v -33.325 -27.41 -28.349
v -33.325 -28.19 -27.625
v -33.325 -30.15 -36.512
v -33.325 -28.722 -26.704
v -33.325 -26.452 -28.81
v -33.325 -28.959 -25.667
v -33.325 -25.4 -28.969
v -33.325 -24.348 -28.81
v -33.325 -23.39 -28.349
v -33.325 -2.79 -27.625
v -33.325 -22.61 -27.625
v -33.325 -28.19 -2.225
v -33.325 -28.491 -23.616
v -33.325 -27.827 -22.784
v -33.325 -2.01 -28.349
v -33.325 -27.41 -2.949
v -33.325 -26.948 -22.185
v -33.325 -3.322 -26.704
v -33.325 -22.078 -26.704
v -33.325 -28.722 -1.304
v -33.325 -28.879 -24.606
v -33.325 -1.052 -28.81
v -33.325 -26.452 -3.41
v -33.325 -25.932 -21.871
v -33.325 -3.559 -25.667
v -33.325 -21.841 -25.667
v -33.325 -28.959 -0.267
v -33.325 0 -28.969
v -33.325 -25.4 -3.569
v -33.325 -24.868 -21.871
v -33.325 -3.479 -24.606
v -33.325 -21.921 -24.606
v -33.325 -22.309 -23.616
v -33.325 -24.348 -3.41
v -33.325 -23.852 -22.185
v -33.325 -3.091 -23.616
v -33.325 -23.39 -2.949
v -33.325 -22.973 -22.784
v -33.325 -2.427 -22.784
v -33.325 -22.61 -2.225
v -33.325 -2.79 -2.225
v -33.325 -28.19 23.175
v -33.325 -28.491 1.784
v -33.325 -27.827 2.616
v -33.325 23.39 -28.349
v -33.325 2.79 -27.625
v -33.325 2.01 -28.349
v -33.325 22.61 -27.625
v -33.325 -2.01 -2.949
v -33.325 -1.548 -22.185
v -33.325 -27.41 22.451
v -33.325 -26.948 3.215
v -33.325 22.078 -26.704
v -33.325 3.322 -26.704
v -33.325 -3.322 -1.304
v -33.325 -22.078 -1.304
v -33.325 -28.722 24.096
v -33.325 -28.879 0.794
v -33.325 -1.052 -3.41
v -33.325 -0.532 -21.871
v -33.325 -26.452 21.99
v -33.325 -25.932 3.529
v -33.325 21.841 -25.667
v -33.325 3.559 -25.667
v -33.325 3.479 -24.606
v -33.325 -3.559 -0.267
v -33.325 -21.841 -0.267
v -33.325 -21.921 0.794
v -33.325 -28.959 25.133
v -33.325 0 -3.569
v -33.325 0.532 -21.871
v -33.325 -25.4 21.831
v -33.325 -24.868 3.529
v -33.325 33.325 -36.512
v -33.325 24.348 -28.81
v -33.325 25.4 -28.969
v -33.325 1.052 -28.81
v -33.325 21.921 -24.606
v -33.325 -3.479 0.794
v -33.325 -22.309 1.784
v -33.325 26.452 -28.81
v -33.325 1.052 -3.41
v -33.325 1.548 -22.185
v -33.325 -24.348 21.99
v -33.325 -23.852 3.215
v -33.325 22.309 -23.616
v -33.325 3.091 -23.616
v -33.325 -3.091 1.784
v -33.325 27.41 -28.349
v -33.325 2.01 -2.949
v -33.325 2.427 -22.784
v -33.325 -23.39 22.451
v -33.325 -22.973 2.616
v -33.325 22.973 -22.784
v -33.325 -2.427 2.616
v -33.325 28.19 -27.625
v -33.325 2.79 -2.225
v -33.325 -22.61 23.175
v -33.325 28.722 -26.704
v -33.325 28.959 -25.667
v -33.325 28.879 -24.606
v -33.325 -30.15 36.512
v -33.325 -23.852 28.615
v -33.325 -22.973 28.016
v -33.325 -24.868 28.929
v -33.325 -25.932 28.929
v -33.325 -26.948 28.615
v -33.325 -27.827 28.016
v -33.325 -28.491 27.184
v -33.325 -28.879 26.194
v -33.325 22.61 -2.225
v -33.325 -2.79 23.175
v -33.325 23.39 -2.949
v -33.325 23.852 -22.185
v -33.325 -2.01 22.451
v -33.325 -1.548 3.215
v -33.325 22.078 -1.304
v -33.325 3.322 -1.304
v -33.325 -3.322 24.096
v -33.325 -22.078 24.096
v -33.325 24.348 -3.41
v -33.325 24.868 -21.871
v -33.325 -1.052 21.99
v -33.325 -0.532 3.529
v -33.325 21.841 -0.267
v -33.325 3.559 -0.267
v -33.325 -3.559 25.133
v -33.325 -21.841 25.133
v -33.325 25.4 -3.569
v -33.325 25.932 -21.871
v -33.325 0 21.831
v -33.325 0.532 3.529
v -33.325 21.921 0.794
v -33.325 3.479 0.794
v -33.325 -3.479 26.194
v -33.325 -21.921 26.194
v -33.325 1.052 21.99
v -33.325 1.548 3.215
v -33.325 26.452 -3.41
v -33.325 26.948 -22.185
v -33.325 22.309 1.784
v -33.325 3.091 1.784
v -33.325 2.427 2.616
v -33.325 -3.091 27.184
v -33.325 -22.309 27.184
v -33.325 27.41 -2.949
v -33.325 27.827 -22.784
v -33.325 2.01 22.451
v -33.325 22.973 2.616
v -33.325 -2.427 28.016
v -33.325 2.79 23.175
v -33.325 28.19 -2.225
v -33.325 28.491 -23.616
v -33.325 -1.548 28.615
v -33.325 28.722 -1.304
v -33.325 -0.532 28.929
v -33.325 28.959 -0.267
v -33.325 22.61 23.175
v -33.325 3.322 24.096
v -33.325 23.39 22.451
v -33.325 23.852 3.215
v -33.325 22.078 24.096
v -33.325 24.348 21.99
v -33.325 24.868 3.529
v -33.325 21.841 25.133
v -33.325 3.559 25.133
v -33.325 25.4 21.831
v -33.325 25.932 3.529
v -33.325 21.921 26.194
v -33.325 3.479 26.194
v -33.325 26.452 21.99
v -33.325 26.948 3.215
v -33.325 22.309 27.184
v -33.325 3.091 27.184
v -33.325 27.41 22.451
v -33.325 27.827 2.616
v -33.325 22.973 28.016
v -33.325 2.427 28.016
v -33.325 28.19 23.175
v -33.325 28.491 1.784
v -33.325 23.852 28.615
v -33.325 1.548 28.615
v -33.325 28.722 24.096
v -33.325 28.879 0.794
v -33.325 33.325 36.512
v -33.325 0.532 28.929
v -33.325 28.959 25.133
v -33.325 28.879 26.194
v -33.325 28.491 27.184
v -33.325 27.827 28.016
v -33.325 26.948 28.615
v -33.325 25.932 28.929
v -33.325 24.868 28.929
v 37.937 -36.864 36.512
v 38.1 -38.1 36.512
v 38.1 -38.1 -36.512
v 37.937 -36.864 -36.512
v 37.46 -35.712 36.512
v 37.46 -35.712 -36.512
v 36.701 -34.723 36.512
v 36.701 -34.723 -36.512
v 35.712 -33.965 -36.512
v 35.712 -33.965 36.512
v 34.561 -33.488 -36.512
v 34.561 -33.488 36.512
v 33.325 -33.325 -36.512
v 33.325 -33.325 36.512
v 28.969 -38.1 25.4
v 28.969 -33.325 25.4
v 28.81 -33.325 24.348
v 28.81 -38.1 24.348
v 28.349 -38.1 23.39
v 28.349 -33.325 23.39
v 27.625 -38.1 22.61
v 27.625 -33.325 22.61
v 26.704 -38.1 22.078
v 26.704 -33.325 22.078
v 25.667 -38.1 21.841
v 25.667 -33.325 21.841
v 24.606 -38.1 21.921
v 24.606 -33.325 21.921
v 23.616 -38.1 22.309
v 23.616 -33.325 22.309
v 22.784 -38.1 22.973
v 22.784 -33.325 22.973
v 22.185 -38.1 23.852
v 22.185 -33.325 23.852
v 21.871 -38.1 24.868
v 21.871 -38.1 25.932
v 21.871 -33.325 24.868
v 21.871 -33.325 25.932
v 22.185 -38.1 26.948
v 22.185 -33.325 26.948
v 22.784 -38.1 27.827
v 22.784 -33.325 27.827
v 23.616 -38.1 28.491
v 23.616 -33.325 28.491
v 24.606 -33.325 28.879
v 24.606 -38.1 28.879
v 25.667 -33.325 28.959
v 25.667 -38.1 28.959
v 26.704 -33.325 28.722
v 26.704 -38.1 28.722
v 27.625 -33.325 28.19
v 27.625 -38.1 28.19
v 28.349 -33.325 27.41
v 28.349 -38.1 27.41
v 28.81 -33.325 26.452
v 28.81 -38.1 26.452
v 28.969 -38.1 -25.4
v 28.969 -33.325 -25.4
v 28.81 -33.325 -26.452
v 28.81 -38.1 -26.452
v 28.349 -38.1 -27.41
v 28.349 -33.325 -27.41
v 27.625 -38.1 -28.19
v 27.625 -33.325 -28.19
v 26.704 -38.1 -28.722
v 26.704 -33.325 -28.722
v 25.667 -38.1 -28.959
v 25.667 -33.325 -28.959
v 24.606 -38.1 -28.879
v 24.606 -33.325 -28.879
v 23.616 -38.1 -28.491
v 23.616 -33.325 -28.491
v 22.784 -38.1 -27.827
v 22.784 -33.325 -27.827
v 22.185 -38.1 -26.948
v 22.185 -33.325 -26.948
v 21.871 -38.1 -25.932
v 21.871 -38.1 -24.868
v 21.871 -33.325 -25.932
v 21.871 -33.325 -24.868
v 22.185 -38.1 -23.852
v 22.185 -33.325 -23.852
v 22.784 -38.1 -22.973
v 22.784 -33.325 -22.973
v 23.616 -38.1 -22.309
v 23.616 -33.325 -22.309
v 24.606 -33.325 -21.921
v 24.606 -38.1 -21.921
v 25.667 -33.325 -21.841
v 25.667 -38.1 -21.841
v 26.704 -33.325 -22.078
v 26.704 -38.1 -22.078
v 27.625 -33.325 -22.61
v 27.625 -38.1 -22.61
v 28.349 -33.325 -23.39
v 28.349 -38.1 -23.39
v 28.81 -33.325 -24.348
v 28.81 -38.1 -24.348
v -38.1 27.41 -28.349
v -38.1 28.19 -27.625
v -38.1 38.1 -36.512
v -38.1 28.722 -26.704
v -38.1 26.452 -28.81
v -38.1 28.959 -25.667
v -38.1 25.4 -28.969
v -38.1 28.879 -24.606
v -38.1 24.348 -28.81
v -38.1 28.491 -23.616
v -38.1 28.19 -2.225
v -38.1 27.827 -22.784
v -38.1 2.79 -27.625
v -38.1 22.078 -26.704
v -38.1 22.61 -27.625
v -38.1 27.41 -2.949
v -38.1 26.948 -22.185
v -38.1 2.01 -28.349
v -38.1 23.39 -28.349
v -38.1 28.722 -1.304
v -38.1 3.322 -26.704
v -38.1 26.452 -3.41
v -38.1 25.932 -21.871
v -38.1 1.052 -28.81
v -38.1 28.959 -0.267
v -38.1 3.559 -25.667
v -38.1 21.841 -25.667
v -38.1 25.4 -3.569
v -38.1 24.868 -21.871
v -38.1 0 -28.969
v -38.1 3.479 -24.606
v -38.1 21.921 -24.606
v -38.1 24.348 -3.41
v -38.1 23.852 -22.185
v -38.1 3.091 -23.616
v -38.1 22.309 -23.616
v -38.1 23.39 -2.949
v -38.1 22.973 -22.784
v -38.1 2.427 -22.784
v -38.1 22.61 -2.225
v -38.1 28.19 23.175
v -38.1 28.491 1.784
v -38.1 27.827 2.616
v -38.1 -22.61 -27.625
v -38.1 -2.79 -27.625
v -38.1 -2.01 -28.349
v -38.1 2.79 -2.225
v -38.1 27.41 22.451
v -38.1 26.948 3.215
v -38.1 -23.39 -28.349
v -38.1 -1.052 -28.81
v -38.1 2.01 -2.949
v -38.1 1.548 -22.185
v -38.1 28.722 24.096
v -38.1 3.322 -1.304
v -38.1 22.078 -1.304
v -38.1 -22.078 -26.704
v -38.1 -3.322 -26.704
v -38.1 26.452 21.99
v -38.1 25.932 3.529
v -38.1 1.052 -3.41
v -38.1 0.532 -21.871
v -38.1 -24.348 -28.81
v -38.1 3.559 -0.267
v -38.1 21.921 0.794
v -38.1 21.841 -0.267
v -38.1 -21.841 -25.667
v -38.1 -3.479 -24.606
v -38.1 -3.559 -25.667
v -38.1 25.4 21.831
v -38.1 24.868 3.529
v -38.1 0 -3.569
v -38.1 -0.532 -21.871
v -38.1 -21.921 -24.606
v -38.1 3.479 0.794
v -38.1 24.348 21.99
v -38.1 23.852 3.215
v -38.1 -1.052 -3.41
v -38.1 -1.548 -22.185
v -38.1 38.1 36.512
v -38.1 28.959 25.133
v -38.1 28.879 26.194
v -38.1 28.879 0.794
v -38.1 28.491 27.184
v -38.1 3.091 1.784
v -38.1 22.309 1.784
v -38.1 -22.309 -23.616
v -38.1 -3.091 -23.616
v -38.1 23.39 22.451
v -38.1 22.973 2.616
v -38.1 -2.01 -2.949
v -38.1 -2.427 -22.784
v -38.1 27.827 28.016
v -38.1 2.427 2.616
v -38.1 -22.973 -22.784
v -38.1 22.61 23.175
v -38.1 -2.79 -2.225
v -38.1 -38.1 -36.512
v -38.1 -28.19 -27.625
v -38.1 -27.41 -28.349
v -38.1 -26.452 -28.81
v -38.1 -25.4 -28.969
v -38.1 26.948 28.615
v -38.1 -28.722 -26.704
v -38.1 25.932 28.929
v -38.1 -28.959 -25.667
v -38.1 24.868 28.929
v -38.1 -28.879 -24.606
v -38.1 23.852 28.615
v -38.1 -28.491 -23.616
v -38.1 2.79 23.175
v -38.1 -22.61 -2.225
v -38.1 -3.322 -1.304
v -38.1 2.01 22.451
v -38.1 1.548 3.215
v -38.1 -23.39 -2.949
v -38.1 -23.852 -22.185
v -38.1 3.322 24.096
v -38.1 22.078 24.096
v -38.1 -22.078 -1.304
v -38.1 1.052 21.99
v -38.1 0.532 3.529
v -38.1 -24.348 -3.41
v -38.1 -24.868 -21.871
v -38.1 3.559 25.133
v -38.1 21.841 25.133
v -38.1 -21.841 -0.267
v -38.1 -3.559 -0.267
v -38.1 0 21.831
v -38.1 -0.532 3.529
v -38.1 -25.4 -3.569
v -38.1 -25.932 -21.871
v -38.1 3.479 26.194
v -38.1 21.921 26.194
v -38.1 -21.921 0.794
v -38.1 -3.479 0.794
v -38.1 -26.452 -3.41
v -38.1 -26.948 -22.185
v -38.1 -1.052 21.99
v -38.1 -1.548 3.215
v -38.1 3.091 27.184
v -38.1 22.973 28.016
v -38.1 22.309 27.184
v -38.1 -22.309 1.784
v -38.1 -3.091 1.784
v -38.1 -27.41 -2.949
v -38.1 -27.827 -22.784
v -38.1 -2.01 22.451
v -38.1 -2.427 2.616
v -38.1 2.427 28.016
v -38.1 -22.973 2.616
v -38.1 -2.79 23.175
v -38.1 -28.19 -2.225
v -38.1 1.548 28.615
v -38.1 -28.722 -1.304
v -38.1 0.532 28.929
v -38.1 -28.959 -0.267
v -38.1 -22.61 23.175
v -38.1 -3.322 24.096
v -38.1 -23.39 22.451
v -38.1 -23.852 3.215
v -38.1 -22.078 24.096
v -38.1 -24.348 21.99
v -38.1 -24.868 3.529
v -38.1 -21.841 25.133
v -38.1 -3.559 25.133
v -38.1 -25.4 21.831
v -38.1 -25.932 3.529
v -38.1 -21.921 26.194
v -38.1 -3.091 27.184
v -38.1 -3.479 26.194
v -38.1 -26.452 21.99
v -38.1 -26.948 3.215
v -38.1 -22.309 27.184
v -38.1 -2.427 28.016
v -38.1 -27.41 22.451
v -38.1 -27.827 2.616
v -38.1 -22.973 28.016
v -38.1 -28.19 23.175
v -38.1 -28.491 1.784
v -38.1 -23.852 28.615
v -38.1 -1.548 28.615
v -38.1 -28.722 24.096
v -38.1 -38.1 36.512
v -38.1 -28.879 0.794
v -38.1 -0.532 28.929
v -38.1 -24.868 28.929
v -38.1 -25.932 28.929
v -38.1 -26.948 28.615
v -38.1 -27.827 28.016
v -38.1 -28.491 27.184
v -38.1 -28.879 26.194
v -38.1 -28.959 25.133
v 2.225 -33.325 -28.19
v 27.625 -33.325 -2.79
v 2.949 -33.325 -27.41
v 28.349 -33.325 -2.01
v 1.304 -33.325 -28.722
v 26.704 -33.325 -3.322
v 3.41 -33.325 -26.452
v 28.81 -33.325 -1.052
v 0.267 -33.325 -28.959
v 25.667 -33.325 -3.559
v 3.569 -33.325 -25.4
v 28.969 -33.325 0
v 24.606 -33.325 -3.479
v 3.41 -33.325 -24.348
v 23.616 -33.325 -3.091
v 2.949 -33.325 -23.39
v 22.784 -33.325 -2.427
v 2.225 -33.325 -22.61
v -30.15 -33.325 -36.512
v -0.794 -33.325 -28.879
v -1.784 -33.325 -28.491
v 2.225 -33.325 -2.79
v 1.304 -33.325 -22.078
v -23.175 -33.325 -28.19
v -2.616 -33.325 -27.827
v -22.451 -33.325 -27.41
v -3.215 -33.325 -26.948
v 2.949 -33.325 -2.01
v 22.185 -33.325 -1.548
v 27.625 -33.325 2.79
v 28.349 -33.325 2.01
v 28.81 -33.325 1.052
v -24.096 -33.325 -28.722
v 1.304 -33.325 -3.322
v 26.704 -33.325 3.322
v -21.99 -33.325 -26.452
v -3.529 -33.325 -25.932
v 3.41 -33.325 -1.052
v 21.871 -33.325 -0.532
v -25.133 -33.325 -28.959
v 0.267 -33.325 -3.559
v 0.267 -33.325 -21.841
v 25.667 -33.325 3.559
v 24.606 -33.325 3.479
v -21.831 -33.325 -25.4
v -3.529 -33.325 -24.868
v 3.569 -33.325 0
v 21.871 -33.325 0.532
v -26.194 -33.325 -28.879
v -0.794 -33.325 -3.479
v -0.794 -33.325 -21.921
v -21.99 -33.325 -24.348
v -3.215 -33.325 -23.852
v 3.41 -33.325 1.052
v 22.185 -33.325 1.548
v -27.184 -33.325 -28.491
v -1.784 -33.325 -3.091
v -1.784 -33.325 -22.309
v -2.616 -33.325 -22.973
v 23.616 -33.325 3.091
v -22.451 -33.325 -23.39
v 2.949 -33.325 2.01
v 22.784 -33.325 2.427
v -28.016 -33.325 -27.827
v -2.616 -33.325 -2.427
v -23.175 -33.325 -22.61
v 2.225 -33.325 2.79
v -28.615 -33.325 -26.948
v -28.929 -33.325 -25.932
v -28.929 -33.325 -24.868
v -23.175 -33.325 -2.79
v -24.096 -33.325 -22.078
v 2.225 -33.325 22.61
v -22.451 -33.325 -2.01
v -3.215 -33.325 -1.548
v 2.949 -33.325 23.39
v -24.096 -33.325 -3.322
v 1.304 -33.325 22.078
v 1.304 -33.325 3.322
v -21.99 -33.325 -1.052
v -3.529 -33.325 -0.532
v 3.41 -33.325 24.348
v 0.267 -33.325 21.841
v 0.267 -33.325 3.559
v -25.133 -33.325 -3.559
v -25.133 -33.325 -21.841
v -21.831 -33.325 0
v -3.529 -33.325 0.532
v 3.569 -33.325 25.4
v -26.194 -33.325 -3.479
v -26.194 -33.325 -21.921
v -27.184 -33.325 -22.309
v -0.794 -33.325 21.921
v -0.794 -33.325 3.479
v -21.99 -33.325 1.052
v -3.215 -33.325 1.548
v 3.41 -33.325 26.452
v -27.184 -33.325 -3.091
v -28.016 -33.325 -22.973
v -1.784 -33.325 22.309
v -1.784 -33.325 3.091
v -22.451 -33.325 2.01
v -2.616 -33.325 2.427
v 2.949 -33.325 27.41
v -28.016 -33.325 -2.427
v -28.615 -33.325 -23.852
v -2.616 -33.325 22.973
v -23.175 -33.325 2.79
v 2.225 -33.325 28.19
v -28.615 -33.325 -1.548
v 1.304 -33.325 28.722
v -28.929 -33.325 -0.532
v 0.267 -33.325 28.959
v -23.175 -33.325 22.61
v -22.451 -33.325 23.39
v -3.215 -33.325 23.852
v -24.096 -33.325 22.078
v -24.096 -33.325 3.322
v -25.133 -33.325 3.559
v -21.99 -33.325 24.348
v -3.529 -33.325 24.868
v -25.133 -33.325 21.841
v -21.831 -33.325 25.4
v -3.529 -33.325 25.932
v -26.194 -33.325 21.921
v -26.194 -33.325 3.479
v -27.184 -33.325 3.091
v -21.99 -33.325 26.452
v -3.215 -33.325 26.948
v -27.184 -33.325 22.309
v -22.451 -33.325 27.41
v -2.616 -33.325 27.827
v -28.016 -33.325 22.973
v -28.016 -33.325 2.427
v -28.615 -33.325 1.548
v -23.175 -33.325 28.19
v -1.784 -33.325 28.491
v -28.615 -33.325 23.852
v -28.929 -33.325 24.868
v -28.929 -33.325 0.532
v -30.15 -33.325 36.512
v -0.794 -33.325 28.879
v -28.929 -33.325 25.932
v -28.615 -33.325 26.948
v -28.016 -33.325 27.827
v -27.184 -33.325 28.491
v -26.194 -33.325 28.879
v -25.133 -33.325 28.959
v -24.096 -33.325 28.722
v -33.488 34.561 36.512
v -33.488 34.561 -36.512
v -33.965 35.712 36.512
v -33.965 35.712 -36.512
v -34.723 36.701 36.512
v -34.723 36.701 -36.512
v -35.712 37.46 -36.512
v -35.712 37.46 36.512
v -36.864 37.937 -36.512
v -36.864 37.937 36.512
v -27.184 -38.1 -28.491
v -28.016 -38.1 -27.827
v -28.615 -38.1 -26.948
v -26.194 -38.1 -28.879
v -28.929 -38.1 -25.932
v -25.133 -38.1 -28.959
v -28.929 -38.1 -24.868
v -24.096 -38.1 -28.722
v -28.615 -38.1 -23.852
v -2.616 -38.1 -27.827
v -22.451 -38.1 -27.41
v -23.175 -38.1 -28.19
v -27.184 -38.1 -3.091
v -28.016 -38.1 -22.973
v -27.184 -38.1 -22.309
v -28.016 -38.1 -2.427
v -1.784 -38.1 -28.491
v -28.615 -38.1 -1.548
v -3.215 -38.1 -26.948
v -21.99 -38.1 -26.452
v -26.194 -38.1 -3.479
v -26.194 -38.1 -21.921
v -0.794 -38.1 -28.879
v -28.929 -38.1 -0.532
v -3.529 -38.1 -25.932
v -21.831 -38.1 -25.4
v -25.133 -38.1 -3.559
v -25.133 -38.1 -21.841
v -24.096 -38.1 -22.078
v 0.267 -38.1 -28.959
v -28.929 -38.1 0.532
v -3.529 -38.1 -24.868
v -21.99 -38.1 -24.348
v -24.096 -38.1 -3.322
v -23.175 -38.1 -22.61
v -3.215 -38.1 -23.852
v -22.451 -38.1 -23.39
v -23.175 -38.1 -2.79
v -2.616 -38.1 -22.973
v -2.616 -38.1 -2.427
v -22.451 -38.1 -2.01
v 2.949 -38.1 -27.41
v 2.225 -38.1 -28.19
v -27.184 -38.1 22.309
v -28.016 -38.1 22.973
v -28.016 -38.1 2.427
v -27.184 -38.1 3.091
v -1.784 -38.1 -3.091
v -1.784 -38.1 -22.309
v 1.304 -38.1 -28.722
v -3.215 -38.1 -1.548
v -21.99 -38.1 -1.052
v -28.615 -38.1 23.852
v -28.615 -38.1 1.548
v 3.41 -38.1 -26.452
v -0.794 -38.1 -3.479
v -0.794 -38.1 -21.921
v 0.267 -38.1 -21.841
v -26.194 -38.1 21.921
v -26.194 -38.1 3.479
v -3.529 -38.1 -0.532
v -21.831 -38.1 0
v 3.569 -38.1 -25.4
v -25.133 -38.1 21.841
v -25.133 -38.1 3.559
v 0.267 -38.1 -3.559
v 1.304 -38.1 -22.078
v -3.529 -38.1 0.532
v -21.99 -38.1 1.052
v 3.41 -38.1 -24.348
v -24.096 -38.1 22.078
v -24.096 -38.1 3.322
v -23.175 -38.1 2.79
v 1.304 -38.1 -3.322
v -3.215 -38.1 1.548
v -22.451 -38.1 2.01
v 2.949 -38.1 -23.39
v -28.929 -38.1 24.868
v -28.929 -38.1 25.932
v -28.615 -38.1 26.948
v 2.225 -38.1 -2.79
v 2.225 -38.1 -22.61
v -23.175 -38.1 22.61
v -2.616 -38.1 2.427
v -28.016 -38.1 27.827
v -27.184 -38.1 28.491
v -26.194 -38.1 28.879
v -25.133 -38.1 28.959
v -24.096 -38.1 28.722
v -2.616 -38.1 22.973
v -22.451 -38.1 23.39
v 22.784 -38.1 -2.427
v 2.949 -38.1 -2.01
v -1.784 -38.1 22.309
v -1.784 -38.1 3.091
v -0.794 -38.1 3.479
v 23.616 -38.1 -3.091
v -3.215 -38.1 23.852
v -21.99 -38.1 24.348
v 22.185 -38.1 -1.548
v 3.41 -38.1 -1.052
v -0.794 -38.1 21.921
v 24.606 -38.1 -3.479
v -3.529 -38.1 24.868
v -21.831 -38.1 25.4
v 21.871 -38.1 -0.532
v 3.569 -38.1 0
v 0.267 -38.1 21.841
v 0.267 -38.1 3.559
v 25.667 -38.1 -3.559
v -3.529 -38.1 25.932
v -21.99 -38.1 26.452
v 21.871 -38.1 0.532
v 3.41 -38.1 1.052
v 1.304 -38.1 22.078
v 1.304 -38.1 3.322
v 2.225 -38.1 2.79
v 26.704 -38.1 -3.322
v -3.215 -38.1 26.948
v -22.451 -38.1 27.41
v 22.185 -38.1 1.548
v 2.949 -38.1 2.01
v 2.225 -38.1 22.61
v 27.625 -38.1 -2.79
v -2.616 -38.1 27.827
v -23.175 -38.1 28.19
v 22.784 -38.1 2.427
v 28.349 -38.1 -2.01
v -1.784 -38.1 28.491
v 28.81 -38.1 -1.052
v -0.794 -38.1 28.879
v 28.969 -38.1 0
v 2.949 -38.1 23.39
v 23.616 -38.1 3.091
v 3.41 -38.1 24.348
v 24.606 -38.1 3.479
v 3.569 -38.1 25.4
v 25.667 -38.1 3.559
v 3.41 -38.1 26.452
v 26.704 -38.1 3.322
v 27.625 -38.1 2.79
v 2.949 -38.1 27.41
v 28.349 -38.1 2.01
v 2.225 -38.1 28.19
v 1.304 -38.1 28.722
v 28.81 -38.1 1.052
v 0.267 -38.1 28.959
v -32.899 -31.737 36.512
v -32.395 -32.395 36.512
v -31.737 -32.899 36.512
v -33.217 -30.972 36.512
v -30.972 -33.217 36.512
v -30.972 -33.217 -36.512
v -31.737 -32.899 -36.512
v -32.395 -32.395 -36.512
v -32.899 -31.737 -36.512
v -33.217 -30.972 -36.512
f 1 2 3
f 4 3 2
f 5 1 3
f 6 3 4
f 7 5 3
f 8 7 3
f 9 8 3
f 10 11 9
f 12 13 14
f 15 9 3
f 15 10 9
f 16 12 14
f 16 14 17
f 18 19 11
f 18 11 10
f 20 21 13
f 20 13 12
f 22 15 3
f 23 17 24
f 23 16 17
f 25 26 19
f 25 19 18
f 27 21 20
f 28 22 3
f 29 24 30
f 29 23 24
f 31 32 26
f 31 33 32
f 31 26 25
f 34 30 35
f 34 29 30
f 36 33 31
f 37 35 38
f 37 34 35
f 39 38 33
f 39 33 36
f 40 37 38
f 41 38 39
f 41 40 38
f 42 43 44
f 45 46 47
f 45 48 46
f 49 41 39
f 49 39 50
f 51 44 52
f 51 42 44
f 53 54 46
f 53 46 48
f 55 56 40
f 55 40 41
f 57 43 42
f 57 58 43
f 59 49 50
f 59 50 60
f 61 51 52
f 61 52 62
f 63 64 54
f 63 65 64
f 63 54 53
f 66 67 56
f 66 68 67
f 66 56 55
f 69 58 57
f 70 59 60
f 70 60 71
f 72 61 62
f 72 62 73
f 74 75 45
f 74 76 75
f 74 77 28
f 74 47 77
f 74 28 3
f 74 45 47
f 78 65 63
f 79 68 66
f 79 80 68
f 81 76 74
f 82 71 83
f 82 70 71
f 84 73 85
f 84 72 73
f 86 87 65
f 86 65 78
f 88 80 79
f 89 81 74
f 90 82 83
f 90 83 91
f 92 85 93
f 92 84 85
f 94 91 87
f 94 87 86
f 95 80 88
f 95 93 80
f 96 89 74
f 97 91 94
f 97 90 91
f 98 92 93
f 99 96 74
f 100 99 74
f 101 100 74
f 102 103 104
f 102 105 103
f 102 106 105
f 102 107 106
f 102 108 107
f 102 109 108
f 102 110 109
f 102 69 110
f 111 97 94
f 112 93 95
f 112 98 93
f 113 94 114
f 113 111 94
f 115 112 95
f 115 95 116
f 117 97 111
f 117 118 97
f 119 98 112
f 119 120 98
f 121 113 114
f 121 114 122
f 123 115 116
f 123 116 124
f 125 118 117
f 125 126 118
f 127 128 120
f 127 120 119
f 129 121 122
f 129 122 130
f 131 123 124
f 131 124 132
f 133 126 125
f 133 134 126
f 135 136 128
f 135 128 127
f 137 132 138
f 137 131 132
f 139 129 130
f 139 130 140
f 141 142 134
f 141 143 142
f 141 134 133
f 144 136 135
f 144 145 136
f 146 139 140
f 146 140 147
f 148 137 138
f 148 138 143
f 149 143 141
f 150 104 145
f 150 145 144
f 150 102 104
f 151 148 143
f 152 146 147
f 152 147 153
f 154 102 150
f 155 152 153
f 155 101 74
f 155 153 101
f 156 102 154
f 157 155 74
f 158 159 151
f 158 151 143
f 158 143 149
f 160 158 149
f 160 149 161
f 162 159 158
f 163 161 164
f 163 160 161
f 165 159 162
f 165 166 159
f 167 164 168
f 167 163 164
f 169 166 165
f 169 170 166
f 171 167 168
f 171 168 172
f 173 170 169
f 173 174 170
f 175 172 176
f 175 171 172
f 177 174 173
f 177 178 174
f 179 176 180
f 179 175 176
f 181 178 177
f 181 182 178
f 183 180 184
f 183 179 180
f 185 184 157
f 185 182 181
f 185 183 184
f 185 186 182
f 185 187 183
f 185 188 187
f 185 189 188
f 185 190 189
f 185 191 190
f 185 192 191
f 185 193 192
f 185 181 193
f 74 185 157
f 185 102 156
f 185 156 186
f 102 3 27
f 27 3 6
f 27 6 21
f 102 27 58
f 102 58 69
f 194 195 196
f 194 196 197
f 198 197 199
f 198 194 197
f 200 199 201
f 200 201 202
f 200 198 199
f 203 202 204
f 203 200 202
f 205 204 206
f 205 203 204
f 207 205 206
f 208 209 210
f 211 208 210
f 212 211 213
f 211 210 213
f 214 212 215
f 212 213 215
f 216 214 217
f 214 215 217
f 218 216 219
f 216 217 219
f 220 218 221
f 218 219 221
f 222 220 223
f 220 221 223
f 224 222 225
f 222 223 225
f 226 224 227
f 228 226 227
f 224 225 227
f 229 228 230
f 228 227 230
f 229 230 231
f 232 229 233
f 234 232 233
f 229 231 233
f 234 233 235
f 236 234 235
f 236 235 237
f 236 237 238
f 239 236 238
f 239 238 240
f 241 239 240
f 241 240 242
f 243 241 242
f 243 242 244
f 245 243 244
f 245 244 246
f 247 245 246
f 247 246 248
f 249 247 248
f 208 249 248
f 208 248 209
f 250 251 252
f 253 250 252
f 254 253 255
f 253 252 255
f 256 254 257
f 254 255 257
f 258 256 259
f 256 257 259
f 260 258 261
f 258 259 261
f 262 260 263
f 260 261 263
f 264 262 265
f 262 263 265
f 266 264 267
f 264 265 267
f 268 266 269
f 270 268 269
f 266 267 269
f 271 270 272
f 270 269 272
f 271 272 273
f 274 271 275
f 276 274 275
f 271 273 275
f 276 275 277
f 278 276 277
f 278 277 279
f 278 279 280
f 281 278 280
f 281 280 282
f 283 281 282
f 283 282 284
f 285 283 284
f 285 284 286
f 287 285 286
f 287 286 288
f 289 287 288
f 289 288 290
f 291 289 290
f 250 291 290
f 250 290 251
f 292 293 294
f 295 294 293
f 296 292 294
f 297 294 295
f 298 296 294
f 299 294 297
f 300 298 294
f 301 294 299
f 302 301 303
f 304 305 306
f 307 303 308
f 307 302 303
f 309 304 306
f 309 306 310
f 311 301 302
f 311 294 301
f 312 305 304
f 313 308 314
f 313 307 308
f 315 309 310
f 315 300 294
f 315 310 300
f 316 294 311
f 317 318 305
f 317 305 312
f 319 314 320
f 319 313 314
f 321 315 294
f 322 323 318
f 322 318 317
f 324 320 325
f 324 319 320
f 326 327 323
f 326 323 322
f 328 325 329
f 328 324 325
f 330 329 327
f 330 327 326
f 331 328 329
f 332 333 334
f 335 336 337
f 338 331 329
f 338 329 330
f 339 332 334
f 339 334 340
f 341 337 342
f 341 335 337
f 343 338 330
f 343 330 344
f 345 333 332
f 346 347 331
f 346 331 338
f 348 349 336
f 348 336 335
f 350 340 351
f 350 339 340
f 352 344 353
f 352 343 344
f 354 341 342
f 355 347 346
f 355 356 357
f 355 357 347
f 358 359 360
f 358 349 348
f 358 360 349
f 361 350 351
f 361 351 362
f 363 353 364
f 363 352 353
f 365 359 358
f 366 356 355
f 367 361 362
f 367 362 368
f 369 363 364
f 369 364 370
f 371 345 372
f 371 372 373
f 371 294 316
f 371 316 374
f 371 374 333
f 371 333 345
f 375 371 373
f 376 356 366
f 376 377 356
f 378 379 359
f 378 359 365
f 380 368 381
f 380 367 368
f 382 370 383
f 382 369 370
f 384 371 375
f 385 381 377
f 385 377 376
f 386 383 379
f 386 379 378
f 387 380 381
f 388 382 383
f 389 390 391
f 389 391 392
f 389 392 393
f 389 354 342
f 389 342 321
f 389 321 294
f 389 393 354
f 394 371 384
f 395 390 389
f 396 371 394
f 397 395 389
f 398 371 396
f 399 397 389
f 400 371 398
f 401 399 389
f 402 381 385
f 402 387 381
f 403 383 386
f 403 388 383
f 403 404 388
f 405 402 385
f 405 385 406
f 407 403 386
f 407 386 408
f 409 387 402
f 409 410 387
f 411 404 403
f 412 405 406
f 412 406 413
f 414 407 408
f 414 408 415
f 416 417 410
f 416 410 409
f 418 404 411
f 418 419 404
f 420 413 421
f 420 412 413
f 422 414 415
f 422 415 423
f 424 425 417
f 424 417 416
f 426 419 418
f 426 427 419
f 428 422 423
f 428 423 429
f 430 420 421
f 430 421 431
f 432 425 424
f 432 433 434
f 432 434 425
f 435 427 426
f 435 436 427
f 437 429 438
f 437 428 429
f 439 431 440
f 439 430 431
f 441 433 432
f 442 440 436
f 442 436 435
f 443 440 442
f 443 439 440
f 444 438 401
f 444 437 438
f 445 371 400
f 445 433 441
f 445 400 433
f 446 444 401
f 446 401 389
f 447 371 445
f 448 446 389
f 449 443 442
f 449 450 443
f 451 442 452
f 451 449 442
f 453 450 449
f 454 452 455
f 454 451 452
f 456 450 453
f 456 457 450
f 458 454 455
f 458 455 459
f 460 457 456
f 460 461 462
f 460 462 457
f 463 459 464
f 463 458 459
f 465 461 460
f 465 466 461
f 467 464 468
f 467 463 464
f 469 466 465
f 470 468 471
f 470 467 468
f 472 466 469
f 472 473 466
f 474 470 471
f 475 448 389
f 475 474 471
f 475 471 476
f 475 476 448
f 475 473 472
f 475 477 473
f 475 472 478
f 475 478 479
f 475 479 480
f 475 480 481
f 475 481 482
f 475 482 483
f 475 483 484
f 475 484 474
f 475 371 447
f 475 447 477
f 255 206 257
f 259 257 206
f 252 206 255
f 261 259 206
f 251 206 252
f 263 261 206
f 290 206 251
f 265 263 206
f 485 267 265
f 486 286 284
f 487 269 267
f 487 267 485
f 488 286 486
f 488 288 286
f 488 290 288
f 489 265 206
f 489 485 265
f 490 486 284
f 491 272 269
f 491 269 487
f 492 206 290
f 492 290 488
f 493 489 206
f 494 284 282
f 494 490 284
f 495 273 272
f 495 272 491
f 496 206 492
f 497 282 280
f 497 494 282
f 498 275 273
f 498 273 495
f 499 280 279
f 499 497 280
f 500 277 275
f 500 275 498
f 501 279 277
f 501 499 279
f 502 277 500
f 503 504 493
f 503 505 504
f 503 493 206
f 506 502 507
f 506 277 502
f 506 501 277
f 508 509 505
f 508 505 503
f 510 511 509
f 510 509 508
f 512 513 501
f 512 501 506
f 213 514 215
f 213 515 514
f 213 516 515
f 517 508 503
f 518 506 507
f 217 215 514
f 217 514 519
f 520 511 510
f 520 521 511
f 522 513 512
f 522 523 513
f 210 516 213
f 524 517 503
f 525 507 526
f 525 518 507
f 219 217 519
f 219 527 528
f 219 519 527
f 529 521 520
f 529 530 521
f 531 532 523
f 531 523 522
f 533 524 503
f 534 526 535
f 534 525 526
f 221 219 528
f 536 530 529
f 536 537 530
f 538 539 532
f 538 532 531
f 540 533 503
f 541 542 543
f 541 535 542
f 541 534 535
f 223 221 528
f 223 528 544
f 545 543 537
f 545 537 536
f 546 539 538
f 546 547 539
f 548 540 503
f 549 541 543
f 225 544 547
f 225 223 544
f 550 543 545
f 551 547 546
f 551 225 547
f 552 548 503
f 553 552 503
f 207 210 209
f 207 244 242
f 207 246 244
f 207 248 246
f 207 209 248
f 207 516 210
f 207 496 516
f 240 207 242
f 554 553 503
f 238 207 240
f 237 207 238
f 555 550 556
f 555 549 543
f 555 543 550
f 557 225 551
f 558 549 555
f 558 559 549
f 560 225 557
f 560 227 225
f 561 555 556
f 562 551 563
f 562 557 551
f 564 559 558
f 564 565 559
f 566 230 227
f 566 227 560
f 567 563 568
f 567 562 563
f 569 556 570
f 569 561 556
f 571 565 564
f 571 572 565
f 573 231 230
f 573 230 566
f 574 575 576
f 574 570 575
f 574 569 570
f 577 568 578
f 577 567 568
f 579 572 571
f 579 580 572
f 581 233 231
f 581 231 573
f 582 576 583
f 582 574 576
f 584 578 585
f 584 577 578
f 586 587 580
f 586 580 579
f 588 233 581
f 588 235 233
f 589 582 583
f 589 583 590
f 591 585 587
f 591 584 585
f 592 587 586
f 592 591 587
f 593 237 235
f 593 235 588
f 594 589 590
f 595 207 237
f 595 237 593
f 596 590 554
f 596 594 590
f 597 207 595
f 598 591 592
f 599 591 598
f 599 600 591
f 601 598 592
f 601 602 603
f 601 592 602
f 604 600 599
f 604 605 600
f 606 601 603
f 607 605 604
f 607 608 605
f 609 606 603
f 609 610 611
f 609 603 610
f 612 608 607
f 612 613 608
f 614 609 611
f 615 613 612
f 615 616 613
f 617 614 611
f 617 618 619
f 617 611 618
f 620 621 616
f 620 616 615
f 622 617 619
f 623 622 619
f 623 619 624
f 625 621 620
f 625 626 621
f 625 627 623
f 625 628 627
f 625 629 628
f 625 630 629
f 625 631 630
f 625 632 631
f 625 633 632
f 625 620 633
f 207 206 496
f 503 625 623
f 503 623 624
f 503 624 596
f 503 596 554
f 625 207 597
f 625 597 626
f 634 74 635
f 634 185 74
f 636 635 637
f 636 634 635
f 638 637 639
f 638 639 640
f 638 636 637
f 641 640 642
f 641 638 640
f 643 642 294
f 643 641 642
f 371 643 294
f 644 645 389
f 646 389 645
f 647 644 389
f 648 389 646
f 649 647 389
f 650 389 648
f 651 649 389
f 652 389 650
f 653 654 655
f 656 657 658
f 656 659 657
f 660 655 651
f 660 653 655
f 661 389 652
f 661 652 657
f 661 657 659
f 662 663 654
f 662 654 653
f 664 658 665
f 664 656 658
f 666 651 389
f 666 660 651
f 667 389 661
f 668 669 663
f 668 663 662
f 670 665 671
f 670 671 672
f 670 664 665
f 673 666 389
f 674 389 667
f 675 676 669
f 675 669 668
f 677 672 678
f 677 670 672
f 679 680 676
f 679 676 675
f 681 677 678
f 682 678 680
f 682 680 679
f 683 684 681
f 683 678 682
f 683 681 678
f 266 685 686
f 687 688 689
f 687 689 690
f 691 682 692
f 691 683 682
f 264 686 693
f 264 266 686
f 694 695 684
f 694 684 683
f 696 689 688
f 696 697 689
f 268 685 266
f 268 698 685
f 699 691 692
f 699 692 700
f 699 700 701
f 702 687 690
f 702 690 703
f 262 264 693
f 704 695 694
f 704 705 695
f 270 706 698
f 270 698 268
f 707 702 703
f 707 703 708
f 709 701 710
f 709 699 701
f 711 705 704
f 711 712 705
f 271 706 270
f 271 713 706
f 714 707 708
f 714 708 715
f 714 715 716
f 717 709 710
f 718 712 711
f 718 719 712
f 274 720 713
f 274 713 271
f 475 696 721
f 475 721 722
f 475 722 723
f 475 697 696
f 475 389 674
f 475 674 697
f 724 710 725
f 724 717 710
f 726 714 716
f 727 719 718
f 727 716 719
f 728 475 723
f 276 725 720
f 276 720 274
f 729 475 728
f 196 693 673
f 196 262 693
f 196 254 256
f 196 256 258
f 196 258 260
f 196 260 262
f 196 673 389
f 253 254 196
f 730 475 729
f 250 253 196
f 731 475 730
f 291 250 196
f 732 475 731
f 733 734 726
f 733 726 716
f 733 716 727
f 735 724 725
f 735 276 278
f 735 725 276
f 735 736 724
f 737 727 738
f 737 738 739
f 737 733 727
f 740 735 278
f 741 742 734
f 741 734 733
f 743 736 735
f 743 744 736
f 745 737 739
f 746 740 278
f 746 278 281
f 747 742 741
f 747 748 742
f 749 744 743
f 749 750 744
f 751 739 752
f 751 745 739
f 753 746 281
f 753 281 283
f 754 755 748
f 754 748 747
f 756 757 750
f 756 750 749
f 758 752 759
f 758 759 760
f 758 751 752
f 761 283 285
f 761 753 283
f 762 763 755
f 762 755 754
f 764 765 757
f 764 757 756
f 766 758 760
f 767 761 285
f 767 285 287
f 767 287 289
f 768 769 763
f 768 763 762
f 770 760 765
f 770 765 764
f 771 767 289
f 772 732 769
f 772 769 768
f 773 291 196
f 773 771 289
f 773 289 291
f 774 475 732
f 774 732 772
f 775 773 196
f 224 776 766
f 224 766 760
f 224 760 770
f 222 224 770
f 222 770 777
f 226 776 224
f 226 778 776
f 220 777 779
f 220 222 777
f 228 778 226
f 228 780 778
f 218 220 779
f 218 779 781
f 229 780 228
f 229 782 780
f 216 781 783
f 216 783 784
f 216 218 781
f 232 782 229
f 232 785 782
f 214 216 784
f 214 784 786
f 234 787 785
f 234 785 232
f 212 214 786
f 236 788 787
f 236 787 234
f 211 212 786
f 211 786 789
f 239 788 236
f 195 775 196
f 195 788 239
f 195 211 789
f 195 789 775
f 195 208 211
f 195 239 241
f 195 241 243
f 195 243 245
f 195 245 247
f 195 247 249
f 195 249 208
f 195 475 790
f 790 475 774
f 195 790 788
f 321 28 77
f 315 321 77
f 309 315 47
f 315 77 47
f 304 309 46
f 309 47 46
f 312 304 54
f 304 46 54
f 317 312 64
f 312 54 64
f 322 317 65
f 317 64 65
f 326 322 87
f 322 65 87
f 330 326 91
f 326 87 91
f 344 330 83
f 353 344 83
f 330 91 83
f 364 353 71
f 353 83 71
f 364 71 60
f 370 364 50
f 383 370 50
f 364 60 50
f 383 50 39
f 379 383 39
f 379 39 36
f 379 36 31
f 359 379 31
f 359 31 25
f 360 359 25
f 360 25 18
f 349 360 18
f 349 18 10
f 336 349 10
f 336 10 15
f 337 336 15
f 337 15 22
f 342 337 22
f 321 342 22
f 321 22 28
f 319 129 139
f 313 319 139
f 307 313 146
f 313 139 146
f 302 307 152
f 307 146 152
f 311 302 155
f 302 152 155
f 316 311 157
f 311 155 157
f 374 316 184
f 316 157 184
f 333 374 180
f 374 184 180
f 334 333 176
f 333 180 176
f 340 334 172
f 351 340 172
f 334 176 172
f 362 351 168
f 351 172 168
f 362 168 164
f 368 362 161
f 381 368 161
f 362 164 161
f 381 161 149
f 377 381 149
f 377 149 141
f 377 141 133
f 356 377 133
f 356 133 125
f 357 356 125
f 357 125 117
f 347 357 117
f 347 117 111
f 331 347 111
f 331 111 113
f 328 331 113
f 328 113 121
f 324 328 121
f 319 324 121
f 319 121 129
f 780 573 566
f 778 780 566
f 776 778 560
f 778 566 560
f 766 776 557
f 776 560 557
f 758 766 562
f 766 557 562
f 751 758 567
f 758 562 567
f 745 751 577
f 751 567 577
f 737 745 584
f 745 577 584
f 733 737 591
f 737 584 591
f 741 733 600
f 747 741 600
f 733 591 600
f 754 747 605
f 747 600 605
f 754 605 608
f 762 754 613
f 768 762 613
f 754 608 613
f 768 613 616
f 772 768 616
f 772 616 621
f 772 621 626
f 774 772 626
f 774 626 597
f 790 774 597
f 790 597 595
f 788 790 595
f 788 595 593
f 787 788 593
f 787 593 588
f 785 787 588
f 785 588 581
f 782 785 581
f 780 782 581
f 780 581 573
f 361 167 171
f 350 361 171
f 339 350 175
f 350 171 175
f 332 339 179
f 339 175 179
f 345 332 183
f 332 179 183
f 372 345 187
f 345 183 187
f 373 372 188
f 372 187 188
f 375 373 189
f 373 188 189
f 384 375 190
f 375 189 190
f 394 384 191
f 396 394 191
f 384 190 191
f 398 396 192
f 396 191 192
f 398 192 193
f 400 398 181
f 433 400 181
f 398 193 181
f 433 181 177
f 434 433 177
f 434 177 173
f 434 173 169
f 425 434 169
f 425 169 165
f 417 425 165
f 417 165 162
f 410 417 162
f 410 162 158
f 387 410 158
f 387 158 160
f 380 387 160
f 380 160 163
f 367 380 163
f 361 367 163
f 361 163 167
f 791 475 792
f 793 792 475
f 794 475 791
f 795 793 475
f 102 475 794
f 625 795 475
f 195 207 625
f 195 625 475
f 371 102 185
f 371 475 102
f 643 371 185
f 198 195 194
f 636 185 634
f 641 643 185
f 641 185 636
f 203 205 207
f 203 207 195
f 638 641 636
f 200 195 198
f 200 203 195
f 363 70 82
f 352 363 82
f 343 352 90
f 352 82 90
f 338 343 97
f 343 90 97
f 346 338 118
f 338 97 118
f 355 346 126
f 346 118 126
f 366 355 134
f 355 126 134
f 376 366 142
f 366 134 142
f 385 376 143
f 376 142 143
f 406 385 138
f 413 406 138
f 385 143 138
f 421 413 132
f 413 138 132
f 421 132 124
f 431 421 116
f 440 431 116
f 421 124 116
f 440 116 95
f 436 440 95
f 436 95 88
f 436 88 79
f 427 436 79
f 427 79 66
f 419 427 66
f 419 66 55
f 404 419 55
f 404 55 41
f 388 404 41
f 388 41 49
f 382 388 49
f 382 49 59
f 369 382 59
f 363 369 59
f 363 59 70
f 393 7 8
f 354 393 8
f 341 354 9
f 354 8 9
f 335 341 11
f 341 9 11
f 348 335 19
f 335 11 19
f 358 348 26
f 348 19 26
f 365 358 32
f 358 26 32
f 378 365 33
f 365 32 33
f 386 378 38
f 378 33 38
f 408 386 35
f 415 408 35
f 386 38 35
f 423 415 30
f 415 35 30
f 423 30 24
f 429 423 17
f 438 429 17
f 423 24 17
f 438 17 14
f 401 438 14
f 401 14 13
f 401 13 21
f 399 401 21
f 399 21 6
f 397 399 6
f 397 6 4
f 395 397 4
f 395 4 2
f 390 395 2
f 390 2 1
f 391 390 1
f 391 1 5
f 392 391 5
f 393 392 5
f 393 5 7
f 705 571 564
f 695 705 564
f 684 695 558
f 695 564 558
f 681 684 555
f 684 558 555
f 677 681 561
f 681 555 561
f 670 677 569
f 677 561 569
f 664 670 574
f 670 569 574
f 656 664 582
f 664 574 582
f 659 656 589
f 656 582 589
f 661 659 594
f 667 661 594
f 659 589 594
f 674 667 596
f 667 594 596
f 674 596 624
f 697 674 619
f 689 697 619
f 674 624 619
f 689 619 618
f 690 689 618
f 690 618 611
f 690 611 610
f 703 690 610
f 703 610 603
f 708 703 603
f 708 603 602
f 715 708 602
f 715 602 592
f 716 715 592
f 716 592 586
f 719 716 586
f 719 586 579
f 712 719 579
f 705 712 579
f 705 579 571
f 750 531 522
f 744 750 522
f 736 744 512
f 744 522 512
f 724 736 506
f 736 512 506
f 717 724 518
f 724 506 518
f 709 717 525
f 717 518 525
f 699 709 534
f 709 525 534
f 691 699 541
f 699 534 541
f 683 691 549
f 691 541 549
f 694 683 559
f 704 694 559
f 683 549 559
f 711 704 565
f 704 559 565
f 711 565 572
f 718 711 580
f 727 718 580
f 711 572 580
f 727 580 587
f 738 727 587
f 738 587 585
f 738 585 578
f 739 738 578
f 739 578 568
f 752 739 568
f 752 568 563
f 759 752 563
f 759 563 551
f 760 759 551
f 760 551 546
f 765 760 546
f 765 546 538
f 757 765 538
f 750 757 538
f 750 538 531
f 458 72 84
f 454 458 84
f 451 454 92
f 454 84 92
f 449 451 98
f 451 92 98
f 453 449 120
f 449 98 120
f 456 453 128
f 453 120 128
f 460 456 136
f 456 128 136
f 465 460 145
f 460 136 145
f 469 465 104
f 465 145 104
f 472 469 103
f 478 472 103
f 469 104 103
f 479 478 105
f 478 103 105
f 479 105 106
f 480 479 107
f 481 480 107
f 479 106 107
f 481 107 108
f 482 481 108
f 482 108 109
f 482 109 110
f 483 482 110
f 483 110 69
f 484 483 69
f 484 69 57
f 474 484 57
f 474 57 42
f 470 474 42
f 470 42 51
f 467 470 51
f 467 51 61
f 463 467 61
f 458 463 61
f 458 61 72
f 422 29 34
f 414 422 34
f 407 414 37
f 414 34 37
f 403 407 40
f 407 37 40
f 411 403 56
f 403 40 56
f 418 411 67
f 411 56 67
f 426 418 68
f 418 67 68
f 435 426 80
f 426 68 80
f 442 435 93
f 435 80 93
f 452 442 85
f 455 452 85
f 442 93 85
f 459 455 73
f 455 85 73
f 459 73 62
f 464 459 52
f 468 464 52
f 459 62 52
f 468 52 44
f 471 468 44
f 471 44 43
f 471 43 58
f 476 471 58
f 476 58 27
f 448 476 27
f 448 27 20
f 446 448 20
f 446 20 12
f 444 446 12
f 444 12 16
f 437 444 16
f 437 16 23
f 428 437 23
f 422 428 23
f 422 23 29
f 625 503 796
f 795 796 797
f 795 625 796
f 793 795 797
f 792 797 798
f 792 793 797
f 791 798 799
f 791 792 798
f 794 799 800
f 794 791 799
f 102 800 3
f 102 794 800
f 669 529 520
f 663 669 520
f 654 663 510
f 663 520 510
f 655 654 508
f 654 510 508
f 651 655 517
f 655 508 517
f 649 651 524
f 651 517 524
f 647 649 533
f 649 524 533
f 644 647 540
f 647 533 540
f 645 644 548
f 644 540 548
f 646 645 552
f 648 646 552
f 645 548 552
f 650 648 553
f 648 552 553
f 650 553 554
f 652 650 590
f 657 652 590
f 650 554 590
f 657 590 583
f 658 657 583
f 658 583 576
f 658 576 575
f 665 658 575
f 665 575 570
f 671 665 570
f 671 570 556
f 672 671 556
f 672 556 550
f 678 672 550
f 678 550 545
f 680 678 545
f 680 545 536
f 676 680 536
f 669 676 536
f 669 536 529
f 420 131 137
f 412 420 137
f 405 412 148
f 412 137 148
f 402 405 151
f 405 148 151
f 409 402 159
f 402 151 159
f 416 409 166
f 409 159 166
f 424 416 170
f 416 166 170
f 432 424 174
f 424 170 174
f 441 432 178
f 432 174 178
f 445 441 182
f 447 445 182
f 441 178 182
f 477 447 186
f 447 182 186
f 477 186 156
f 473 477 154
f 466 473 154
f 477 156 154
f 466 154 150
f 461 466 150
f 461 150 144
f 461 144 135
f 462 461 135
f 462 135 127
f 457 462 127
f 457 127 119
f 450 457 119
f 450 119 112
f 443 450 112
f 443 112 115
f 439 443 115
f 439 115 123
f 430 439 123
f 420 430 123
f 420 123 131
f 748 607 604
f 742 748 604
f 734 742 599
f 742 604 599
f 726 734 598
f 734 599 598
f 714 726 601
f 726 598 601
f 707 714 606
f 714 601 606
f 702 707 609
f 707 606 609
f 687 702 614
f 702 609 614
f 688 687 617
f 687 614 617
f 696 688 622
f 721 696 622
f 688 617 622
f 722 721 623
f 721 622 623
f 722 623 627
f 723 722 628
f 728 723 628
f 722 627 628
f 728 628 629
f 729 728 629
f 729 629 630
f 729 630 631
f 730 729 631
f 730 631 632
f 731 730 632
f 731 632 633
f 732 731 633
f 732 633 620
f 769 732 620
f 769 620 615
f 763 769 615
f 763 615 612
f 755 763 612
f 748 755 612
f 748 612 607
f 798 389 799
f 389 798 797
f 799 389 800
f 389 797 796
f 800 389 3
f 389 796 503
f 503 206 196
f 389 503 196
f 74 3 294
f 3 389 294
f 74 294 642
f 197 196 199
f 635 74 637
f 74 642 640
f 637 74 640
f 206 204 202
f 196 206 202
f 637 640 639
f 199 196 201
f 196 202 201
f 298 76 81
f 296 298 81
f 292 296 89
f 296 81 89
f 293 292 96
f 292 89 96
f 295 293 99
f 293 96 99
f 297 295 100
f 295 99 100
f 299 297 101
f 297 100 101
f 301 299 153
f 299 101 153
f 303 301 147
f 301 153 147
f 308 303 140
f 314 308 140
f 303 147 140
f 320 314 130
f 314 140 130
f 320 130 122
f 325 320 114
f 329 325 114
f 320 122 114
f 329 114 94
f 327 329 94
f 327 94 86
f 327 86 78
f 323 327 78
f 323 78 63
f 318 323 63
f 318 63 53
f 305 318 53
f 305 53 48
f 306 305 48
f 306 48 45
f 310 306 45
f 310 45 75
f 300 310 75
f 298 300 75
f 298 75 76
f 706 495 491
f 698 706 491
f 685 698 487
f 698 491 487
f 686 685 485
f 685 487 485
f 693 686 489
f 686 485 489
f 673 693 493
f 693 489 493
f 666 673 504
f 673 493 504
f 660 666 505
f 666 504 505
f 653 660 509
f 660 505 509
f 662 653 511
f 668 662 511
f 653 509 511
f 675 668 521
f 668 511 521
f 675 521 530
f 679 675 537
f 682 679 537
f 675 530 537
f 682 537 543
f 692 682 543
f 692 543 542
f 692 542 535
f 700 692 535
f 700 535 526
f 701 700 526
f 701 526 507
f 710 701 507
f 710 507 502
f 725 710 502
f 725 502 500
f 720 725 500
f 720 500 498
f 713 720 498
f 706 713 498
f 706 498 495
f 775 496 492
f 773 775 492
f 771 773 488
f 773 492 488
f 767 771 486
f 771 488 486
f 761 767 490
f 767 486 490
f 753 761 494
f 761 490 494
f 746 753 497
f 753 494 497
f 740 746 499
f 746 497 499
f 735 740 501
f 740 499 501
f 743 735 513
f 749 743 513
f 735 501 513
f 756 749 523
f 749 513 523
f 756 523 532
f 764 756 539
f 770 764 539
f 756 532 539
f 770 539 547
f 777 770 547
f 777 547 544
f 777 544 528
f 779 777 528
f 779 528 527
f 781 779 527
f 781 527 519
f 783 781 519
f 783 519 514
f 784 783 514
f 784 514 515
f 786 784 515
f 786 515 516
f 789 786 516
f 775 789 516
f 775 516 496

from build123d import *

# Parameters (mm, degrees)
BOSS_EXTRUDE1_DEPTH      = 36.5125
BOSS_EXTRUDE1_DEPTH_BACK = 36.5125
SKETCH4_R                = 3.5687
CUT_EXTRUDE1_DEPTH       = 5.7752
SKETCH5_R                = 3.5687
CUT_EXTRUDE2_DEPTH       = 5.7752


with BuildPart() as part:
    # Sketch3 → Boss-Extrude1 (new body, two sides)
    with BuildSketch(Plane.XY) as boss_extrude1_sk:
        with BuildLine():
            Line((-38.1, 38.1), (-38.1, -38.1))
            Line((-38.1, -38.1), (38.1, -38.1))
            ThreePointArc((38.1, -38.1), (36.701376302, -34.723423698), (33.3248, -33.3248))
            Line((33.3248, -33.3248), (-30.1498, -33.3248))
            ThreePointArc((-30.1498, -33.3248), (-32.39486403, -32.39486403), (-33.3248, -30.1498))
            Line((-33.3248, -30.1498), (-33.3248, 33.3248))
            ThreePointArc((-33.3248, 33.3248), (-34.723423698, 36.701376302), (-38.1, 38.1))
        make_face()
    extrude(amount=BOSS_EXTRUDE1_DEPTH)
    extrude(boss_extrude1_sk.sketch, amount=-BOSS_EXTRUDE1_DEPTH_BACK)

    # Sketch4 → Cut-Extrude1 (cut, through all)
    with BuildSketch(Plane(origin=(-33.3248, 0, 0), x_dir=(0, 0, -1), z_dir=(1, 0, 0))):
        with Locations((-25.4, -25.4)):
            Circle(SKETCH4_R)
        with Locations((0, -25.4)):
            Circle(SKETCH4_R)
        with Locations((25.4, -25.4)):
            Circle(SKETCH4_R)
        Circle(SKETCH4_R)
        with Locations((25.4, 0)):
            Circle(SKETCH4_R)
        with Locations((0, 25.4)):
            Circle(SKETCH4_R)
        with Locations((25.4, 25.4)):
            Circle(SKETCH4_R)
        with Locations((-25.4, 0)):
            Circle(SKETCH4_R)
        with Locations((-25.4, 25.4)):
            Circle(SKETCH4_R)
    extrude(amount=-CUT_EXTRUDE1_DEPTH, mode=Mode.SUBTRACT)

    # Sketch5 → Cut-Extrude2 (cut, through all)
    with BuildSketch(Plane(origin=(0, -33.3248, -33.3248), x_dir=(1, 0, 0), z_dir=(0, 1, 0))):
        with Locations((-25.4, -58.7248)):
            Circle(SKETCH5_R)
        with Locations((0, -58.7248)):
            Circle(SKETCH5_R)
        with Locations((25.4, -58.7248)):
            Circle(SKETCH5_R)
        with Locations((0, -33.3248)):
            Circle(SKETCH5_R)
        with Locations((25.4, -33.3248)):
            Circle(SKETCH5_R)
        with Locations((0, -7.9248)):
            Circle(SKETCH5_R)
        with Locations((25.4, -7.9248)):
            Circle(SKETCH5_R)
        with Locations((-25.4, -33.3248)):
            Circle(SKETCH5_R)
        with Locations((-25.4, -7.9248)):
            Circle(SKETCH5_R)
    extrude(amount=-CUT_EXTRUDE2_DEPTH, mode=Mode.SUBTRACT)


solid = part.part
